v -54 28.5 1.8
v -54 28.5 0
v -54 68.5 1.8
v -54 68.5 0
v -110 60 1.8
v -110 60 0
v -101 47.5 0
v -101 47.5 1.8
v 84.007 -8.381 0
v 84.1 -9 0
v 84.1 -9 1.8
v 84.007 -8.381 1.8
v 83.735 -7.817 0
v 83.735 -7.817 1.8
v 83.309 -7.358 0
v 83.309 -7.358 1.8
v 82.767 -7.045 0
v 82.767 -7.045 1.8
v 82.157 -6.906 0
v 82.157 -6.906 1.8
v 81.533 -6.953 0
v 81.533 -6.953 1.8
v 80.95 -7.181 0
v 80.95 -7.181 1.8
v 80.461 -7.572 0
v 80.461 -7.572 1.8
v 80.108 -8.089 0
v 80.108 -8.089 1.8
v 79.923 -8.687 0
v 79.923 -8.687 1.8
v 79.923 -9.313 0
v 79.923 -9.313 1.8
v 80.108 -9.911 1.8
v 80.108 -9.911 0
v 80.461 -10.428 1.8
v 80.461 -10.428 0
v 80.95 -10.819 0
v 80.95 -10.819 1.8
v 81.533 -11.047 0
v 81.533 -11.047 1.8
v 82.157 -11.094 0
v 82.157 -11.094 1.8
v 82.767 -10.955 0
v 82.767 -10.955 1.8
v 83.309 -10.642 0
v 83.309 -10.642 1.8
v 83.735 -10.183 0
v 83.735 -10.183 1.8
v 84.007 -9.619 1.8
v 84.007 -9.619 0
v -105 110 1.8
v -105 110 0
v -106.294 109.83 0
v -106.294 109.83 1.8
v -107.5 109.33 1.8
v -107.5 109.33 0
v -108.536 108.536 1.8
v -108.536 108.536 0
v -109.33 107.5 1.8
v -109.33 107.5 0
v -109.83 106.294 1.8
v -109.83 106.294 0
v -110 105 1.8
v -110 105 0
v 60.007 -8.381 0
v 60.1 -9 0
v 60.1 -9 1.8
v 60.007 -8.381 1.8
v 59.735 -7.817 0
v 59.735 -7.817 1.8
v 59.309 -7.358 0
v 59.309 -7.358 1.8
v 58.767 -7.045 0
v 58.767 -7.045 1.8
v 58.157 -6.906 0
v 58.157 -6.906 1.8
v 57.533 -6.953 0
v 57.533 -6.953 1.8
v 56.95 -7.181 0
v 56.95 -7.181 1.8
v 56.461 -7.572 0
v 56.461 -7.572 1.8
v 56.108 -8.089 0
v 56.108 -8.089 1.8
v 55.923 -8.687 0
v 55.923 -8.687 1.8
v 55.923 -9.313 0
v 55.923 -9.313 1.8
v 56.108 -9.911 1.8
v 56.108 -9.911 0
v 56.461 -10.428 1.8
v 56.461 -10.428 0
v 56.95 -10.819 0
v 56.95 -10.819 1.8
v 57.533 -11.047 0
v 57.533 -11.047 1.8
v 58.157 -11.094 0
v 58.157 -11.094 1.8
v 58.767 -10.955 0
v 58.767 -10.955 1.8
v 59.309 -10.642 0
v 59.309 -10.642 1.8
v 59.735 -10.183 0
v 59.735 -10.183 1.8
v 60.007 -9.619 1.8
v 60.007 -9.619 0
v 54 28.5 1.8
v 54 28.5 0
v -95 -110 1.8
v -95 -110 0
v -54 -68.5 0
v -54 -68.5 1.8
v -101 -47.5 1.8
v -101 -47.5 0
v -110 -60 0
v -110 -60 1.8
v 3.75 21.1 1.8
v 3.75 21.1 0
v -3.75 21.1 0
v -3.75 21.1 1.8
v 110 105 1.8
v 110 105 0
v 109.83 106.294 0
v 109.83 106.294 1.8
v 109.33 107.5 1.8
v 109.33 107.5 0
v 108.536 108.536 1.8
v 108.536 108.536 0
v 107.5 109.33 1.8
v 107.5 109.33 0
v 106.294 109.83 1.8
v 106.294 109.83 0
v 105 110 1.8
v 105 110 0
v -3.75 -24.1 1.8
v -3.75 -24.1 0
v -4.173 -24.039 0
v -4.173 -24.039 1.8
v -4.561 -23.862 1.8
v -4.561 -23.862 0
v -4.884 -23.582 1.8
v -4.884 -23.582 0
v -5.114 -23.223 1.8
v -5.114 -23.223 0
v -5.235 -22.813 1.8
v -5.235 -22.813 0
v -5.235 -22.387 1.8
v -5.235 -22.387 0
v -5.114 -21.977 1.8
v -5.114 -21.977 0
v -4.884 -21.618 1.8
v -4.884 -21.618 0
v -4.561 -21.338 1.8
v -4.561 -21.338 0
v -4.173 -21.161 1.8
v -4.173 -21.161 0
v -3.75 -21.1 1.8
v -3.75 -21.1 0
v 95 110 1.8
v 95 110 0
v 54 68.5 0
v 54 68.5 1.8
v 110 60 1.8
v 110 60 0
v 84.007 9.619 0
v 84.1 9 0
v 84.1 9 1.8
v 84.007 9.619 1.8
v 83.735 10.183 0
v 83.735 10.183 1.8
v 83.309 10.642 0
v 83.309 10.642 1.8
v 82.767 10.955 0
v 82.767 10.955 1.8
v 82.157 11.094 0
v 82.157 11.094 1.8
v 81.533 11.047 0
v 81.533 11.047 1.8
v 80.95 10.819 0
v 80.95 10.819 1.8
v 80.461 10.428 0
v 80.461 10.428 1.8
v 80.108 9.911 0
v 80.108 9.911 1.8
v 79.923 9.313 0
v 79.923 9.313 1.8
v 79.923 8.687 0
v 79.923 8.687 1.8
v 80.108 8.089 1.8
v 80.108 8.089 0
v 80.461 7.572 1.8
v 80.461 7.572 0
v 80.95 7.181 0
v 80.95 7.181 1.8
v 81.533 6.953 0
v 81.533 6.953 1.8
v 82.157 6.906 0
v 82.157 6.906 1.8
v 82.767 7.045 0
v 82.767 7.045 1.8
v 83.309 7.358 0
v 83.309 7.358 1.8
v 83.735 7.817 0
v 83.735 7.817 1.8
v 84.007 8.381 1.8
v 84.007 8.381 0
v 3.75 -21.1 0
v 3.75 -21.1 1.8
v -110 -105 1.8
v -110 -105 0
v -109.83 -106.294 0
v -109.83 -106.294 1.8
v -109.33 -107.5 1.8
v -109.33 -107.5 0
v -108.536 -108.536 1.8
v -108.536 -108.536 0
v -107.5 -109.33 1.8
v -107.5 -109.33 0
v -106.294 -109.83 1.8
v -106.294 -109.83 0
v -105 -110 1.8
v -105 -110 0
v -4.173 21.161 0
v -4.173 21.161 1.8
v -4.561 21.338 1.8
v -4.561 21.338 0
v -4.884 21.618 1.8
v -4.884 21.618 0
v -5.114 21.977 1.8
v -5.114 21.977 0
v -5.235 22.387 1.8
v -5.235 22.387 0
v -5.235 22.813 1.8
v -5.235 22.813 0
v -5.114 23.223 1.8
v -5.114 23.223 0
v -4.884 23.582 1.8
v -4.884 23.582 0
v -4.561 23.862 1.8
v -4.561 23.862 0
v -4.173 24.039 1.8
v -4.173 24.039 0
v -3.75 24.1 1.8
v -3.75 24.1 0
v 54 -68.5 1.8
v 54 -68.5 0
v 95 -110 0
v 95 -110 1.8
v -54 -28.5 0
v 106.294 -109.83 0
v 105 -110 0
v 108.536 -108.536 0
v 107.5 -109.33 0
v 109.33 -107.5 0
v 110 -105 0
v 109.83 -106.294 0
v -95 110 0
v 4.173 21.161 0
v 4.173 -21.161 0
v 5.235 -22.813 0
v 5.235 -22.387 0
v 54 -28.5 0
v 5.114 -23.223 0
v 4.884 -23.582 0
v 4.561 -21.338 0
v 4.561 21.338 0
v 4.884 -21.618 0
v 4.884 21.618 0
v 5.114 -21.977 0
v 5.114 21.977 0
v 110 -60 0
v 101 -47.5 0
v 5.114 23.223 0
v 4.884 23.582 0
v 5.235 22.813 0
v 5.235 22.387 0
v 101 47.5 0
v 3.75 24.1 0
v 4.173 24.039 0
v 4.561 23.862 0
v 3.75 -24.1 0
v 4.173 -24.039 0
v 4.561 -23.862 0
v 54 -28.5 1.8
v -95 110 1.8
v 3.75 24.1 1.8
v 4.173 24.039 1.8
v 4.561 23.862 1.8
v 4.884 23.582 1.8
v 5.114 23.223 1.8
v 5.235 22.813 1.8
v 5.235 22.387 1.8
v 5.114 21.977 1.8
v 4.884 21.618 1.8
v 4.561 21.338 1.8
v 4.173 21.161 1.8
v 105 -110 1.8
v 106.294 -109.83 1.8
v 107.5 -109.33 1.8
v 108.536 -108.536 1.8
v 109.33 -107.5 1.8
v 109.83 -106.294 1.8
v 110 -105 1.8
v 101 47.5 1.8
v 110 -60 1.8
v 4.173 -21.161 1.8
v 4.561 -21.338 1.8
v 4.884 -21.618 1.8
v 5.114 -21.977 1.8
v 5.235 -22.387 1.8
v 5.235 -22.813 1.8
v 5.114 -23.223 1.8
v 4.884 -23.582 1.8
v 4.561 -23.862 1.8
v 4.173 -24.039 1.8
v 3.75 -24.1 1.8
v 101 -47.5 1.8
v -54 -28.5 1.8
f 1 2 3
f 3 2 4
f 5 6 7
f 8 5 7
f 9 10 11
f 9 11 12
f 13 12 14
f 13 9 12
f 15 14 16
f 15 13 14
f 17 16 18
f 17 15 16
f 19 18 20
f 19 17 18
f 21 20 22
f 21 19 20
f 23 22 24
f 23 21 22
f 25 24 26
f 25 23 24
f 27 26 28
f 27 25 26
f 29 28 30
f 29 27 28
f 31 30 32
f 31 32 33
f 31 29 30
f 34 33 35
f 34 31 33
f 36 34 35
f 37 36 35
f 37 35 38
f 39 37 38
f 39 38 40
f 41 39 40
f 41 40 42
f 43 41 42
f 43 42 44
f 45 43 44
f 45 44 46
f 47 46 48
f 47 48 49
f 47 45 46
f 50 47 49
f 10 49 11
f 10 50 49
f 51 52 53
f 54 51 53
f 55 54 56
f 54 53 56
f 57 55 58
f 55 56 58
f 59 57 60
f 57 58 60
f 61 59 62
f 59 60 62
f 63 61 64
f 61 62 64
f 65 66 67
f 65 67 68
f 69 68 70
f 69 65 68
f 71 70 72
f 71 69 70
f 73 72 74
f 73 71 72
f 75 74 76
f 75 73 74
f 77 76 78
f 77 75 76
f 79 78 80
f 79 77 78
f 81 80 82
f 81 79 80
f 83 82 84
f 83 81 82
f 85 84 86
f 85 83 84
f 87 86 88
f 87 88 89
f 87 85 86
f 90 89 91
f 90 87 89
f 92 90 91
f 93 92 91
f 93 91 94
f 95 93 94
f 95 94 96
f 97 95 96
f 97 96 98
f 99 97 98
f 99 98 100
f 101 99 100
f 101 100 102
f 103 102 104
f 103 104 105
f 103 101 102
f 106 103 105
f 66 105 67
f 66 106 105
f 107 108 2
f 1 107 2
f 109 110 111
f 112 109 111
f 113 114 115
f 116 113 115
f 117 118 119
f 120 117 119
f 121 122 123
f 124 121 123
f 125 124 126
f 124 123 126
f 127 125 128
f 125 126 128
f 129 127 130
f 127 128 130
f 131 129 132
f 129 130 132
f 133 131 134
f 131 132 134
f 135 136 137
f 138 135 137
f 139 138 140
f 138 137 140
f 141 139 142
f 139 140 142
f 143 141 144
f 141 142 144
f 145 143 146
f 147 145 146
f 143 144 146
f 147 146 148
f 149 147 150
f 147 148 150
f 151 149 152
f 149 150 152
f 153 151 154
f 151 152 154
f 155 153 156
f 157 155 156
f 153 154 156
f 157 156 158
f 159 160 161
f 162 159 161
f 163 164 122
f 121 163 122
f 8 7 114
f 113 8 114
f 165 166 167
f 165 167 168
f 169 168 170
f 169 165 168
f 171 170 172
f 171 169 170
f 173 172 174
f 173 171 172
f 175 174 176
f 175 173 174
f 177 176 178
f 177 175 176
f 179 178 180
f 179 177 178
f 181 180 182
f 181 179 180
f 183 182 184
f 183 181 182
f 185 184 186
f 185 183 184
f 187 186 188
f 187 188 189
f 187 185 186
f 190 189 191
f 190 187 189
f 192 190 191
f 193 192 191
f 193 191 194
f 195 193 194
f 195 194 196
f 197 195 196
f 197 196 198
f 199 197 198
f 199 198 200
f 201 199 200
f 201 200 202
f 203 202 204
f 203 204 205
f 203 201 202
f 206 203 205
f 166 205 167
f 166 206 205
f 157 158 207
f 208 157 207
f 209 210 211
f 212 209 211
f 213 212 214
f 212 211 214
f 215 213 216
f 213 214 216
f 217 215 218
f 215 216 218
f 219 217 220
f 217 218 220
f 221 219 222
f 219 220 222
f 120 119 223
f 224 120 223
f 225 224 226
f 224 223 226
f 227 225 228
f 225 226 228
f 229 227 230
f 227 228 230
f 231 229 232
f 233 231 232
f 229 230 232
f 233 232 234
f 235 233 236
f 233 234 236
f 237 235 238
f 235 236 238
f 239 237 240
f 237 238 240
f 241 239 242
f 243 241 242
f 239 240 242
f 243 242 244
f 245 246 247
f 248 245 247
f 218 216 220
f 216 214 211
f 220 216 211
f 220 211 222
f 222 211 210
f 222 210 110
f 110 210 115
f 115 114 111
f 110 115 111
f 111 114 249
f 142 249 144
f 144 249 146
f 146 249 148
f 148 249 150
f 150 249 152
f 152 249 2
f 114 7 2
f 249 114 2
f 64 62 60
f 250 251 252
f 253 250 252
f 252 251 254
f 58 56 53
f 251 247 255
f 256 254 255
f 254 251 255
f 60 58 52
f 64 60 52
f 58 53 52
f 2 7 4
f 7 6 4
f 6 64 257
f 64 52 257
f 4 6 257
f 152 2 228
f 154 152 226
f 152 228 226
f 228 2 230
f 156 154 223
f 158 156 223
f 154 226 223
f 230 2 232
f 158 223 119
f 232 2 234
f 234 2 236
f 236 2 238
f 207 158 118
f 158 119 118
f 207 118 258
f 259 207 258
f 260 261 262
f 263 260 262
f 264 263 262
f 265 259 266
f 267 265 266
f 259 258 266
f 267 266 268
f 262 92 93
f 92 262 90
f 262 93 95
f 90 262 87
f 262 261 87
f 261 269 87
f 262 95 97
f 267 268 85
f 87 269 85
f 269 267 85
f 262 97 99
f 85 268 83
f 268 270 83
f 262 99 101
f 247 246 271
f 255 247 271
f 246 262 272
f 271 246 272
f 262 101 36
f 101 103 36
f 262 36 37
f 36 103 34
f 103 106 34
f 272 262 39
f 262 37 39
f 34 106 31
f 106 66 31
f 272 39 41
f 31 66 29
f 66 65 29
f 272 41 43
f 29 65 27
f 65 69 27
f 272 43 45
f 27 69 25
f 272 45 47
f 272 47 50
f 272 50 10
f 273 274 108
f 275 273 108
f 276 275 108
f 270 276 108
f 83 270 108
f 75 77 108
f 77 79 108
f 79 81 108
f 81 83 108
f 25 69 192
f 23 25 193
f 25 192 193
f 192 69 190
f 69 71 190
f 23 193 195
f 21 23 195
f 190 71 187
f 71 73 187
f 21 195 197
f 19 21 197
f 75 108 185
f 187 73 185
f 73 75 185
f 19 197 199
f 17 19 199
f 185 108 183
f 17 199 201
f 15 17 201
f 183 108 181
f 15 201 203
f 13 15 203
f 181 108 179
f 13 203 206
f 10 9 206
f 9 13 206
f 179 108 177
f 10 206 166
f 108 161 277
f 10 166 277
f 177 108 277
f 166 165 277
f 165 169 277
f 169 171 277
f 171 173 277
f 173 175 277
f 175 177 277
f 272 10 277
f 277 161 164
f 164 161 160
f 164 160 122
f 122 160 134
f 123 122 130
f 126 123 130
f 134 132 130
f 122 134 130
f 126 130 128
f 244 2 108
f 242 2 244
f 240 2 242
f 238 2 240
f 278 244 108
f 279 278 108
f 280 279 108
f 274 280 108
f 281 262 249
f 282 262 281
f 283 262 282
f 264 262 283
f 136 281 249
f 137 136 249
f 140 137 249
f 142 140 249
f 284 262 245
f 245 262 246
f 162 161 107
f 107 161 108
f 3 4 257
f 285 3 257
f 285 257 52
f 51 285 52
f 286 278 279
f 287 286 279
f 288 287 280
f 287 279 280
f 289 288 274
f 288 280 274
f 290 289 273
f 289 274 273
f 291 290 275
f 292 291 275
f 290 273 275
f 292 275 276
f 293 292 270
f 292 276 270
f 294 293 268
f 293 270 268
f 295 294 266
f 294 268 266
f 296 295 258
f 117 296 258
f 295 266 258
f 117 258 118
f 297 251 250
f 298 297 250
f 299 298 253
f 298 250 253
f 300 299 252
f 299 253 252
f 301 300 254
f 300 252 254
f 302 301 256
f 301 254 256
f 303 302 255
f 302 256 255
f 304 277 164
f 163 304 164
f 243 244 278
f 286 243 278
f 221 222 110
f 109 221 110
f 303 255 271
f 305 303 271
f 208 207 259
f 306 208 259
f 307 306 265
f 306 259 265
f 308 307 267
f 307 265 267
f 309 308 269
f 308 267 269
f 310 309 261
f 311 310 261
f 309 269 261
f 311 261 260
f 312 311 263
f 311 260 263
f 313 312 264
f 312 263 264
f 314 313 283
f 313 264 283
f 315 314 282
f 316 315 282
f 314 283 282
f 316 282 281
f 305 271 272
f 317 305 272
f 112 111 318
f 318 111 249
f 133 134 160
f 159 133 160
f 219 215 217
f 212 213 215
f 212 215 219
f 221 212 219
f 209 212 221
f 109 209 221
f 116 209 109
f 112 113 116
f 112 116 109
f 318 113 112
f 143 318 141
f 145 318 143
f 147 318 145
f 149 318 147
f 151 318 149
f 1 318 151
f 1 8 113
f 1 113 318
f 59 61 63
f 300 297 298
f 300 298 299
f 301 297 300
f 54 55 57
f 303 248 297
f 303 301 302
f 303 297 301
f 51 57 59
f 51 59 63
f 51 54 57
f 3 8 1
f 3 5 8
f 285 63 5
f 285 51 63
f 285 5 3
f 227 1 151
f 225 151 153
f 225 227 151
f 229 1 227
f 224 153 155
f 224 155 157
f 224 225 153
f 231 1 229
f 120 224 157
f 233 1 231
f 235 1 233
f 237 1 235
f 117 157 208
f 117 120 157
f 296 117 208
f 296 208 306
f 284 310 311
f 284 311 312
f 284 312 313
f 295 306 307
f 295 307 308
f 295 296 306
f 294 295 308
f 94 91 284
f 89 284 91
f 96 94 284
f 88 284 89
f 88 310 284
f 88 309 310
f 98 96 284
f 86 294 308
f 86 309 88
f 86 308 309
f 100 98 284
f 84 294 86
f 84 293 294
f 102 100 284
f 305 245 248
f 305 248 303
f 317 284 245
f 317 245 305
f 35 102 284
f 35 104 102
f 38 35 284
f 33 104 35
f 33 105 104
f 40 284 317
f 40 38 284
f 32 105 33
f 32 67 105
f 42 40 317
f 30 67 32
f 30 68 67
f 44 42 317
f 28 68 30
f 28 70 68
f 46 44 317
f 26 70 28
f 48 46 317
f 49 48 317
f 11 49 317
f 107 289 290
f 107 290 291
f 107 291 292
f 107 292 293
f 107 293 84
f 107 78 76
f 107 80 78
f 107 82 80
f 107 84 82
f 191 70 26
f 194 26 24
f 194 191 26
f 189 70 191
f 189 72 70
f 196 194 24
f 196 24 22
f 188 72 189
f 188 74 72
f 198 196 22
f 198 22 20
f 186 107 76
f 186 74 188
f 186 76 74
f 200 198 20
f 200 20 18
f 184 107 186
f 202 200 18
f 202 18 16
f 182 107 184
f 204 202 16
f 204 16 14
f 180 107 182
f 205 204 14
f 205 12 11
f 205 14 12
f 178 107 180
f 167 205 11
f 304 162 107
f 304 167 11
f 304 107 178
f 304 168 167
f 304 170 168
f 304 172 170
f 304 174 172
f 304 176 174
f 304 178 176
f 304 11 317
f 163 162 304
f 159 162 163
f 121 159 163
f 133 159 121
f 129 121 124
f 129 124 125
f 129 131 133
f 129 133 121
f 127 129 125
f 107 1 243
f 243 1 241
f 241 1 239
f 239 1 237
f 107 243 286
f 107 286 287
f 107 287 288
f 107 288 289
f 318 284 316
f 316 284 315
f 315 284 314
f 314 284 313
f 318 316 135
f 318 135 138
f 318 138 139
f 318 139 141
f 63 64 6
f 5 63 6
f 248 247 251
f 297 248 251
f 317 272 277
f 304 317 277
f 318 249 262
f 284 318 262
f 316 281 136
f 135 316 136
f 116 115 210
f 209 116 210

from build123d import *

# Parameters (mm, degrees)
F0_R     = 2.1
F1_DEPTH = 1.8


with BuildPart() as f1:
    # F0 (on Top) → F1 (new body)
    with BuildSketch(Plane.XY):
        with BuildLine():
            Line((54, 68.5), (54, 28.5))
            Line((54, 28.5), (-54, 28.5))
            Line((-54, 28.5), (-54, 68.5))
            Line((-54, 68.5), (-95, 110))
            Line((-95, 110), (-105, 110))
            ThreePointArc((-105, 110), (-108.535534, 108.535534), (-110, 105))
            Line((-110, 105), (-110, 60))
            Line((-110, 60), (-101, 47.5))
            Line((-101, 47.5), (-101, -47.5))
            Line((-101, -47.5), (-110, -60))
            Line((-110, -60), (-110, -105))
            ThreePointArc((-110, -105), (-108.535534, -108.535534), (-105, -110))
            Line((-105, -110), (-95, -110))
            Line((-95, -110), (-54, -68.5))
            Line((-54, -68.5), (-54, -28.5))
            Line((-54, -28.5), (54, -28.5))
            Line((54, -28.5), (54, -68.5))
            Line((54, -68.5), (95, -110))
            Line((95, -110), (105, -110))
            ThreePointArc((105, -110), (108.535534, -108.535534), (110, -105))
            Line((110, -105), (110, -60))
            Line((110, -60), (101, -47.5))
            Line((101, -47.5), (101, 47.5))
            Line((101, 47.5), (110, 60))
            Line((110, 60), (110, 105))
            ThreePointArc((110, 105), (108.535534, 108.535534), (105, 110))
            Line((105, 110), (95, 110))
            Line((95, 110), (54, 68.5))
        make_face()
        with BuildLine():
            Line((-3.75, -21.1), (3.75, -21.1))
            ThreePointArc((3.75, -21.1), (5.25, -22.6), (3.75, -24.1))
            Line((3.75, -24.1), (-3.75, -24.1))
            ThreePointArc((-3.75, -24.1), (-5.25, -22.6), (-3.75, -21.1))
        make_face(mode=Mode.SUBTRACT)
        with Locations((58, -9)):
            Circle(F0_R, mode=Mode.SUBTRACT)
        with Locations((82, -9)):
            Circle(F0_R, mode=Mode.SUBTRACT)
        with BuildLine():
            Line((-3.75, 24.1), (3.75, 24.1))
            ThreePointArc((3.75, 24.1), (5.25, 22.6), (3.75, 21.1))
            Line((3.75, 21.1), (-3.75, 21.1))
            ThreePointArc((-3.75, 21.1), (-5.25, 22.6), (-3.75, 24.1))
        make_face(mode=Mode.SUBTRACT)
        with Locations((82, 9)):
            Circle(F0_R, mode=Mode.SUBTRACT)
    extrude(amount=F1_DEPTH)


solid = f1.part
